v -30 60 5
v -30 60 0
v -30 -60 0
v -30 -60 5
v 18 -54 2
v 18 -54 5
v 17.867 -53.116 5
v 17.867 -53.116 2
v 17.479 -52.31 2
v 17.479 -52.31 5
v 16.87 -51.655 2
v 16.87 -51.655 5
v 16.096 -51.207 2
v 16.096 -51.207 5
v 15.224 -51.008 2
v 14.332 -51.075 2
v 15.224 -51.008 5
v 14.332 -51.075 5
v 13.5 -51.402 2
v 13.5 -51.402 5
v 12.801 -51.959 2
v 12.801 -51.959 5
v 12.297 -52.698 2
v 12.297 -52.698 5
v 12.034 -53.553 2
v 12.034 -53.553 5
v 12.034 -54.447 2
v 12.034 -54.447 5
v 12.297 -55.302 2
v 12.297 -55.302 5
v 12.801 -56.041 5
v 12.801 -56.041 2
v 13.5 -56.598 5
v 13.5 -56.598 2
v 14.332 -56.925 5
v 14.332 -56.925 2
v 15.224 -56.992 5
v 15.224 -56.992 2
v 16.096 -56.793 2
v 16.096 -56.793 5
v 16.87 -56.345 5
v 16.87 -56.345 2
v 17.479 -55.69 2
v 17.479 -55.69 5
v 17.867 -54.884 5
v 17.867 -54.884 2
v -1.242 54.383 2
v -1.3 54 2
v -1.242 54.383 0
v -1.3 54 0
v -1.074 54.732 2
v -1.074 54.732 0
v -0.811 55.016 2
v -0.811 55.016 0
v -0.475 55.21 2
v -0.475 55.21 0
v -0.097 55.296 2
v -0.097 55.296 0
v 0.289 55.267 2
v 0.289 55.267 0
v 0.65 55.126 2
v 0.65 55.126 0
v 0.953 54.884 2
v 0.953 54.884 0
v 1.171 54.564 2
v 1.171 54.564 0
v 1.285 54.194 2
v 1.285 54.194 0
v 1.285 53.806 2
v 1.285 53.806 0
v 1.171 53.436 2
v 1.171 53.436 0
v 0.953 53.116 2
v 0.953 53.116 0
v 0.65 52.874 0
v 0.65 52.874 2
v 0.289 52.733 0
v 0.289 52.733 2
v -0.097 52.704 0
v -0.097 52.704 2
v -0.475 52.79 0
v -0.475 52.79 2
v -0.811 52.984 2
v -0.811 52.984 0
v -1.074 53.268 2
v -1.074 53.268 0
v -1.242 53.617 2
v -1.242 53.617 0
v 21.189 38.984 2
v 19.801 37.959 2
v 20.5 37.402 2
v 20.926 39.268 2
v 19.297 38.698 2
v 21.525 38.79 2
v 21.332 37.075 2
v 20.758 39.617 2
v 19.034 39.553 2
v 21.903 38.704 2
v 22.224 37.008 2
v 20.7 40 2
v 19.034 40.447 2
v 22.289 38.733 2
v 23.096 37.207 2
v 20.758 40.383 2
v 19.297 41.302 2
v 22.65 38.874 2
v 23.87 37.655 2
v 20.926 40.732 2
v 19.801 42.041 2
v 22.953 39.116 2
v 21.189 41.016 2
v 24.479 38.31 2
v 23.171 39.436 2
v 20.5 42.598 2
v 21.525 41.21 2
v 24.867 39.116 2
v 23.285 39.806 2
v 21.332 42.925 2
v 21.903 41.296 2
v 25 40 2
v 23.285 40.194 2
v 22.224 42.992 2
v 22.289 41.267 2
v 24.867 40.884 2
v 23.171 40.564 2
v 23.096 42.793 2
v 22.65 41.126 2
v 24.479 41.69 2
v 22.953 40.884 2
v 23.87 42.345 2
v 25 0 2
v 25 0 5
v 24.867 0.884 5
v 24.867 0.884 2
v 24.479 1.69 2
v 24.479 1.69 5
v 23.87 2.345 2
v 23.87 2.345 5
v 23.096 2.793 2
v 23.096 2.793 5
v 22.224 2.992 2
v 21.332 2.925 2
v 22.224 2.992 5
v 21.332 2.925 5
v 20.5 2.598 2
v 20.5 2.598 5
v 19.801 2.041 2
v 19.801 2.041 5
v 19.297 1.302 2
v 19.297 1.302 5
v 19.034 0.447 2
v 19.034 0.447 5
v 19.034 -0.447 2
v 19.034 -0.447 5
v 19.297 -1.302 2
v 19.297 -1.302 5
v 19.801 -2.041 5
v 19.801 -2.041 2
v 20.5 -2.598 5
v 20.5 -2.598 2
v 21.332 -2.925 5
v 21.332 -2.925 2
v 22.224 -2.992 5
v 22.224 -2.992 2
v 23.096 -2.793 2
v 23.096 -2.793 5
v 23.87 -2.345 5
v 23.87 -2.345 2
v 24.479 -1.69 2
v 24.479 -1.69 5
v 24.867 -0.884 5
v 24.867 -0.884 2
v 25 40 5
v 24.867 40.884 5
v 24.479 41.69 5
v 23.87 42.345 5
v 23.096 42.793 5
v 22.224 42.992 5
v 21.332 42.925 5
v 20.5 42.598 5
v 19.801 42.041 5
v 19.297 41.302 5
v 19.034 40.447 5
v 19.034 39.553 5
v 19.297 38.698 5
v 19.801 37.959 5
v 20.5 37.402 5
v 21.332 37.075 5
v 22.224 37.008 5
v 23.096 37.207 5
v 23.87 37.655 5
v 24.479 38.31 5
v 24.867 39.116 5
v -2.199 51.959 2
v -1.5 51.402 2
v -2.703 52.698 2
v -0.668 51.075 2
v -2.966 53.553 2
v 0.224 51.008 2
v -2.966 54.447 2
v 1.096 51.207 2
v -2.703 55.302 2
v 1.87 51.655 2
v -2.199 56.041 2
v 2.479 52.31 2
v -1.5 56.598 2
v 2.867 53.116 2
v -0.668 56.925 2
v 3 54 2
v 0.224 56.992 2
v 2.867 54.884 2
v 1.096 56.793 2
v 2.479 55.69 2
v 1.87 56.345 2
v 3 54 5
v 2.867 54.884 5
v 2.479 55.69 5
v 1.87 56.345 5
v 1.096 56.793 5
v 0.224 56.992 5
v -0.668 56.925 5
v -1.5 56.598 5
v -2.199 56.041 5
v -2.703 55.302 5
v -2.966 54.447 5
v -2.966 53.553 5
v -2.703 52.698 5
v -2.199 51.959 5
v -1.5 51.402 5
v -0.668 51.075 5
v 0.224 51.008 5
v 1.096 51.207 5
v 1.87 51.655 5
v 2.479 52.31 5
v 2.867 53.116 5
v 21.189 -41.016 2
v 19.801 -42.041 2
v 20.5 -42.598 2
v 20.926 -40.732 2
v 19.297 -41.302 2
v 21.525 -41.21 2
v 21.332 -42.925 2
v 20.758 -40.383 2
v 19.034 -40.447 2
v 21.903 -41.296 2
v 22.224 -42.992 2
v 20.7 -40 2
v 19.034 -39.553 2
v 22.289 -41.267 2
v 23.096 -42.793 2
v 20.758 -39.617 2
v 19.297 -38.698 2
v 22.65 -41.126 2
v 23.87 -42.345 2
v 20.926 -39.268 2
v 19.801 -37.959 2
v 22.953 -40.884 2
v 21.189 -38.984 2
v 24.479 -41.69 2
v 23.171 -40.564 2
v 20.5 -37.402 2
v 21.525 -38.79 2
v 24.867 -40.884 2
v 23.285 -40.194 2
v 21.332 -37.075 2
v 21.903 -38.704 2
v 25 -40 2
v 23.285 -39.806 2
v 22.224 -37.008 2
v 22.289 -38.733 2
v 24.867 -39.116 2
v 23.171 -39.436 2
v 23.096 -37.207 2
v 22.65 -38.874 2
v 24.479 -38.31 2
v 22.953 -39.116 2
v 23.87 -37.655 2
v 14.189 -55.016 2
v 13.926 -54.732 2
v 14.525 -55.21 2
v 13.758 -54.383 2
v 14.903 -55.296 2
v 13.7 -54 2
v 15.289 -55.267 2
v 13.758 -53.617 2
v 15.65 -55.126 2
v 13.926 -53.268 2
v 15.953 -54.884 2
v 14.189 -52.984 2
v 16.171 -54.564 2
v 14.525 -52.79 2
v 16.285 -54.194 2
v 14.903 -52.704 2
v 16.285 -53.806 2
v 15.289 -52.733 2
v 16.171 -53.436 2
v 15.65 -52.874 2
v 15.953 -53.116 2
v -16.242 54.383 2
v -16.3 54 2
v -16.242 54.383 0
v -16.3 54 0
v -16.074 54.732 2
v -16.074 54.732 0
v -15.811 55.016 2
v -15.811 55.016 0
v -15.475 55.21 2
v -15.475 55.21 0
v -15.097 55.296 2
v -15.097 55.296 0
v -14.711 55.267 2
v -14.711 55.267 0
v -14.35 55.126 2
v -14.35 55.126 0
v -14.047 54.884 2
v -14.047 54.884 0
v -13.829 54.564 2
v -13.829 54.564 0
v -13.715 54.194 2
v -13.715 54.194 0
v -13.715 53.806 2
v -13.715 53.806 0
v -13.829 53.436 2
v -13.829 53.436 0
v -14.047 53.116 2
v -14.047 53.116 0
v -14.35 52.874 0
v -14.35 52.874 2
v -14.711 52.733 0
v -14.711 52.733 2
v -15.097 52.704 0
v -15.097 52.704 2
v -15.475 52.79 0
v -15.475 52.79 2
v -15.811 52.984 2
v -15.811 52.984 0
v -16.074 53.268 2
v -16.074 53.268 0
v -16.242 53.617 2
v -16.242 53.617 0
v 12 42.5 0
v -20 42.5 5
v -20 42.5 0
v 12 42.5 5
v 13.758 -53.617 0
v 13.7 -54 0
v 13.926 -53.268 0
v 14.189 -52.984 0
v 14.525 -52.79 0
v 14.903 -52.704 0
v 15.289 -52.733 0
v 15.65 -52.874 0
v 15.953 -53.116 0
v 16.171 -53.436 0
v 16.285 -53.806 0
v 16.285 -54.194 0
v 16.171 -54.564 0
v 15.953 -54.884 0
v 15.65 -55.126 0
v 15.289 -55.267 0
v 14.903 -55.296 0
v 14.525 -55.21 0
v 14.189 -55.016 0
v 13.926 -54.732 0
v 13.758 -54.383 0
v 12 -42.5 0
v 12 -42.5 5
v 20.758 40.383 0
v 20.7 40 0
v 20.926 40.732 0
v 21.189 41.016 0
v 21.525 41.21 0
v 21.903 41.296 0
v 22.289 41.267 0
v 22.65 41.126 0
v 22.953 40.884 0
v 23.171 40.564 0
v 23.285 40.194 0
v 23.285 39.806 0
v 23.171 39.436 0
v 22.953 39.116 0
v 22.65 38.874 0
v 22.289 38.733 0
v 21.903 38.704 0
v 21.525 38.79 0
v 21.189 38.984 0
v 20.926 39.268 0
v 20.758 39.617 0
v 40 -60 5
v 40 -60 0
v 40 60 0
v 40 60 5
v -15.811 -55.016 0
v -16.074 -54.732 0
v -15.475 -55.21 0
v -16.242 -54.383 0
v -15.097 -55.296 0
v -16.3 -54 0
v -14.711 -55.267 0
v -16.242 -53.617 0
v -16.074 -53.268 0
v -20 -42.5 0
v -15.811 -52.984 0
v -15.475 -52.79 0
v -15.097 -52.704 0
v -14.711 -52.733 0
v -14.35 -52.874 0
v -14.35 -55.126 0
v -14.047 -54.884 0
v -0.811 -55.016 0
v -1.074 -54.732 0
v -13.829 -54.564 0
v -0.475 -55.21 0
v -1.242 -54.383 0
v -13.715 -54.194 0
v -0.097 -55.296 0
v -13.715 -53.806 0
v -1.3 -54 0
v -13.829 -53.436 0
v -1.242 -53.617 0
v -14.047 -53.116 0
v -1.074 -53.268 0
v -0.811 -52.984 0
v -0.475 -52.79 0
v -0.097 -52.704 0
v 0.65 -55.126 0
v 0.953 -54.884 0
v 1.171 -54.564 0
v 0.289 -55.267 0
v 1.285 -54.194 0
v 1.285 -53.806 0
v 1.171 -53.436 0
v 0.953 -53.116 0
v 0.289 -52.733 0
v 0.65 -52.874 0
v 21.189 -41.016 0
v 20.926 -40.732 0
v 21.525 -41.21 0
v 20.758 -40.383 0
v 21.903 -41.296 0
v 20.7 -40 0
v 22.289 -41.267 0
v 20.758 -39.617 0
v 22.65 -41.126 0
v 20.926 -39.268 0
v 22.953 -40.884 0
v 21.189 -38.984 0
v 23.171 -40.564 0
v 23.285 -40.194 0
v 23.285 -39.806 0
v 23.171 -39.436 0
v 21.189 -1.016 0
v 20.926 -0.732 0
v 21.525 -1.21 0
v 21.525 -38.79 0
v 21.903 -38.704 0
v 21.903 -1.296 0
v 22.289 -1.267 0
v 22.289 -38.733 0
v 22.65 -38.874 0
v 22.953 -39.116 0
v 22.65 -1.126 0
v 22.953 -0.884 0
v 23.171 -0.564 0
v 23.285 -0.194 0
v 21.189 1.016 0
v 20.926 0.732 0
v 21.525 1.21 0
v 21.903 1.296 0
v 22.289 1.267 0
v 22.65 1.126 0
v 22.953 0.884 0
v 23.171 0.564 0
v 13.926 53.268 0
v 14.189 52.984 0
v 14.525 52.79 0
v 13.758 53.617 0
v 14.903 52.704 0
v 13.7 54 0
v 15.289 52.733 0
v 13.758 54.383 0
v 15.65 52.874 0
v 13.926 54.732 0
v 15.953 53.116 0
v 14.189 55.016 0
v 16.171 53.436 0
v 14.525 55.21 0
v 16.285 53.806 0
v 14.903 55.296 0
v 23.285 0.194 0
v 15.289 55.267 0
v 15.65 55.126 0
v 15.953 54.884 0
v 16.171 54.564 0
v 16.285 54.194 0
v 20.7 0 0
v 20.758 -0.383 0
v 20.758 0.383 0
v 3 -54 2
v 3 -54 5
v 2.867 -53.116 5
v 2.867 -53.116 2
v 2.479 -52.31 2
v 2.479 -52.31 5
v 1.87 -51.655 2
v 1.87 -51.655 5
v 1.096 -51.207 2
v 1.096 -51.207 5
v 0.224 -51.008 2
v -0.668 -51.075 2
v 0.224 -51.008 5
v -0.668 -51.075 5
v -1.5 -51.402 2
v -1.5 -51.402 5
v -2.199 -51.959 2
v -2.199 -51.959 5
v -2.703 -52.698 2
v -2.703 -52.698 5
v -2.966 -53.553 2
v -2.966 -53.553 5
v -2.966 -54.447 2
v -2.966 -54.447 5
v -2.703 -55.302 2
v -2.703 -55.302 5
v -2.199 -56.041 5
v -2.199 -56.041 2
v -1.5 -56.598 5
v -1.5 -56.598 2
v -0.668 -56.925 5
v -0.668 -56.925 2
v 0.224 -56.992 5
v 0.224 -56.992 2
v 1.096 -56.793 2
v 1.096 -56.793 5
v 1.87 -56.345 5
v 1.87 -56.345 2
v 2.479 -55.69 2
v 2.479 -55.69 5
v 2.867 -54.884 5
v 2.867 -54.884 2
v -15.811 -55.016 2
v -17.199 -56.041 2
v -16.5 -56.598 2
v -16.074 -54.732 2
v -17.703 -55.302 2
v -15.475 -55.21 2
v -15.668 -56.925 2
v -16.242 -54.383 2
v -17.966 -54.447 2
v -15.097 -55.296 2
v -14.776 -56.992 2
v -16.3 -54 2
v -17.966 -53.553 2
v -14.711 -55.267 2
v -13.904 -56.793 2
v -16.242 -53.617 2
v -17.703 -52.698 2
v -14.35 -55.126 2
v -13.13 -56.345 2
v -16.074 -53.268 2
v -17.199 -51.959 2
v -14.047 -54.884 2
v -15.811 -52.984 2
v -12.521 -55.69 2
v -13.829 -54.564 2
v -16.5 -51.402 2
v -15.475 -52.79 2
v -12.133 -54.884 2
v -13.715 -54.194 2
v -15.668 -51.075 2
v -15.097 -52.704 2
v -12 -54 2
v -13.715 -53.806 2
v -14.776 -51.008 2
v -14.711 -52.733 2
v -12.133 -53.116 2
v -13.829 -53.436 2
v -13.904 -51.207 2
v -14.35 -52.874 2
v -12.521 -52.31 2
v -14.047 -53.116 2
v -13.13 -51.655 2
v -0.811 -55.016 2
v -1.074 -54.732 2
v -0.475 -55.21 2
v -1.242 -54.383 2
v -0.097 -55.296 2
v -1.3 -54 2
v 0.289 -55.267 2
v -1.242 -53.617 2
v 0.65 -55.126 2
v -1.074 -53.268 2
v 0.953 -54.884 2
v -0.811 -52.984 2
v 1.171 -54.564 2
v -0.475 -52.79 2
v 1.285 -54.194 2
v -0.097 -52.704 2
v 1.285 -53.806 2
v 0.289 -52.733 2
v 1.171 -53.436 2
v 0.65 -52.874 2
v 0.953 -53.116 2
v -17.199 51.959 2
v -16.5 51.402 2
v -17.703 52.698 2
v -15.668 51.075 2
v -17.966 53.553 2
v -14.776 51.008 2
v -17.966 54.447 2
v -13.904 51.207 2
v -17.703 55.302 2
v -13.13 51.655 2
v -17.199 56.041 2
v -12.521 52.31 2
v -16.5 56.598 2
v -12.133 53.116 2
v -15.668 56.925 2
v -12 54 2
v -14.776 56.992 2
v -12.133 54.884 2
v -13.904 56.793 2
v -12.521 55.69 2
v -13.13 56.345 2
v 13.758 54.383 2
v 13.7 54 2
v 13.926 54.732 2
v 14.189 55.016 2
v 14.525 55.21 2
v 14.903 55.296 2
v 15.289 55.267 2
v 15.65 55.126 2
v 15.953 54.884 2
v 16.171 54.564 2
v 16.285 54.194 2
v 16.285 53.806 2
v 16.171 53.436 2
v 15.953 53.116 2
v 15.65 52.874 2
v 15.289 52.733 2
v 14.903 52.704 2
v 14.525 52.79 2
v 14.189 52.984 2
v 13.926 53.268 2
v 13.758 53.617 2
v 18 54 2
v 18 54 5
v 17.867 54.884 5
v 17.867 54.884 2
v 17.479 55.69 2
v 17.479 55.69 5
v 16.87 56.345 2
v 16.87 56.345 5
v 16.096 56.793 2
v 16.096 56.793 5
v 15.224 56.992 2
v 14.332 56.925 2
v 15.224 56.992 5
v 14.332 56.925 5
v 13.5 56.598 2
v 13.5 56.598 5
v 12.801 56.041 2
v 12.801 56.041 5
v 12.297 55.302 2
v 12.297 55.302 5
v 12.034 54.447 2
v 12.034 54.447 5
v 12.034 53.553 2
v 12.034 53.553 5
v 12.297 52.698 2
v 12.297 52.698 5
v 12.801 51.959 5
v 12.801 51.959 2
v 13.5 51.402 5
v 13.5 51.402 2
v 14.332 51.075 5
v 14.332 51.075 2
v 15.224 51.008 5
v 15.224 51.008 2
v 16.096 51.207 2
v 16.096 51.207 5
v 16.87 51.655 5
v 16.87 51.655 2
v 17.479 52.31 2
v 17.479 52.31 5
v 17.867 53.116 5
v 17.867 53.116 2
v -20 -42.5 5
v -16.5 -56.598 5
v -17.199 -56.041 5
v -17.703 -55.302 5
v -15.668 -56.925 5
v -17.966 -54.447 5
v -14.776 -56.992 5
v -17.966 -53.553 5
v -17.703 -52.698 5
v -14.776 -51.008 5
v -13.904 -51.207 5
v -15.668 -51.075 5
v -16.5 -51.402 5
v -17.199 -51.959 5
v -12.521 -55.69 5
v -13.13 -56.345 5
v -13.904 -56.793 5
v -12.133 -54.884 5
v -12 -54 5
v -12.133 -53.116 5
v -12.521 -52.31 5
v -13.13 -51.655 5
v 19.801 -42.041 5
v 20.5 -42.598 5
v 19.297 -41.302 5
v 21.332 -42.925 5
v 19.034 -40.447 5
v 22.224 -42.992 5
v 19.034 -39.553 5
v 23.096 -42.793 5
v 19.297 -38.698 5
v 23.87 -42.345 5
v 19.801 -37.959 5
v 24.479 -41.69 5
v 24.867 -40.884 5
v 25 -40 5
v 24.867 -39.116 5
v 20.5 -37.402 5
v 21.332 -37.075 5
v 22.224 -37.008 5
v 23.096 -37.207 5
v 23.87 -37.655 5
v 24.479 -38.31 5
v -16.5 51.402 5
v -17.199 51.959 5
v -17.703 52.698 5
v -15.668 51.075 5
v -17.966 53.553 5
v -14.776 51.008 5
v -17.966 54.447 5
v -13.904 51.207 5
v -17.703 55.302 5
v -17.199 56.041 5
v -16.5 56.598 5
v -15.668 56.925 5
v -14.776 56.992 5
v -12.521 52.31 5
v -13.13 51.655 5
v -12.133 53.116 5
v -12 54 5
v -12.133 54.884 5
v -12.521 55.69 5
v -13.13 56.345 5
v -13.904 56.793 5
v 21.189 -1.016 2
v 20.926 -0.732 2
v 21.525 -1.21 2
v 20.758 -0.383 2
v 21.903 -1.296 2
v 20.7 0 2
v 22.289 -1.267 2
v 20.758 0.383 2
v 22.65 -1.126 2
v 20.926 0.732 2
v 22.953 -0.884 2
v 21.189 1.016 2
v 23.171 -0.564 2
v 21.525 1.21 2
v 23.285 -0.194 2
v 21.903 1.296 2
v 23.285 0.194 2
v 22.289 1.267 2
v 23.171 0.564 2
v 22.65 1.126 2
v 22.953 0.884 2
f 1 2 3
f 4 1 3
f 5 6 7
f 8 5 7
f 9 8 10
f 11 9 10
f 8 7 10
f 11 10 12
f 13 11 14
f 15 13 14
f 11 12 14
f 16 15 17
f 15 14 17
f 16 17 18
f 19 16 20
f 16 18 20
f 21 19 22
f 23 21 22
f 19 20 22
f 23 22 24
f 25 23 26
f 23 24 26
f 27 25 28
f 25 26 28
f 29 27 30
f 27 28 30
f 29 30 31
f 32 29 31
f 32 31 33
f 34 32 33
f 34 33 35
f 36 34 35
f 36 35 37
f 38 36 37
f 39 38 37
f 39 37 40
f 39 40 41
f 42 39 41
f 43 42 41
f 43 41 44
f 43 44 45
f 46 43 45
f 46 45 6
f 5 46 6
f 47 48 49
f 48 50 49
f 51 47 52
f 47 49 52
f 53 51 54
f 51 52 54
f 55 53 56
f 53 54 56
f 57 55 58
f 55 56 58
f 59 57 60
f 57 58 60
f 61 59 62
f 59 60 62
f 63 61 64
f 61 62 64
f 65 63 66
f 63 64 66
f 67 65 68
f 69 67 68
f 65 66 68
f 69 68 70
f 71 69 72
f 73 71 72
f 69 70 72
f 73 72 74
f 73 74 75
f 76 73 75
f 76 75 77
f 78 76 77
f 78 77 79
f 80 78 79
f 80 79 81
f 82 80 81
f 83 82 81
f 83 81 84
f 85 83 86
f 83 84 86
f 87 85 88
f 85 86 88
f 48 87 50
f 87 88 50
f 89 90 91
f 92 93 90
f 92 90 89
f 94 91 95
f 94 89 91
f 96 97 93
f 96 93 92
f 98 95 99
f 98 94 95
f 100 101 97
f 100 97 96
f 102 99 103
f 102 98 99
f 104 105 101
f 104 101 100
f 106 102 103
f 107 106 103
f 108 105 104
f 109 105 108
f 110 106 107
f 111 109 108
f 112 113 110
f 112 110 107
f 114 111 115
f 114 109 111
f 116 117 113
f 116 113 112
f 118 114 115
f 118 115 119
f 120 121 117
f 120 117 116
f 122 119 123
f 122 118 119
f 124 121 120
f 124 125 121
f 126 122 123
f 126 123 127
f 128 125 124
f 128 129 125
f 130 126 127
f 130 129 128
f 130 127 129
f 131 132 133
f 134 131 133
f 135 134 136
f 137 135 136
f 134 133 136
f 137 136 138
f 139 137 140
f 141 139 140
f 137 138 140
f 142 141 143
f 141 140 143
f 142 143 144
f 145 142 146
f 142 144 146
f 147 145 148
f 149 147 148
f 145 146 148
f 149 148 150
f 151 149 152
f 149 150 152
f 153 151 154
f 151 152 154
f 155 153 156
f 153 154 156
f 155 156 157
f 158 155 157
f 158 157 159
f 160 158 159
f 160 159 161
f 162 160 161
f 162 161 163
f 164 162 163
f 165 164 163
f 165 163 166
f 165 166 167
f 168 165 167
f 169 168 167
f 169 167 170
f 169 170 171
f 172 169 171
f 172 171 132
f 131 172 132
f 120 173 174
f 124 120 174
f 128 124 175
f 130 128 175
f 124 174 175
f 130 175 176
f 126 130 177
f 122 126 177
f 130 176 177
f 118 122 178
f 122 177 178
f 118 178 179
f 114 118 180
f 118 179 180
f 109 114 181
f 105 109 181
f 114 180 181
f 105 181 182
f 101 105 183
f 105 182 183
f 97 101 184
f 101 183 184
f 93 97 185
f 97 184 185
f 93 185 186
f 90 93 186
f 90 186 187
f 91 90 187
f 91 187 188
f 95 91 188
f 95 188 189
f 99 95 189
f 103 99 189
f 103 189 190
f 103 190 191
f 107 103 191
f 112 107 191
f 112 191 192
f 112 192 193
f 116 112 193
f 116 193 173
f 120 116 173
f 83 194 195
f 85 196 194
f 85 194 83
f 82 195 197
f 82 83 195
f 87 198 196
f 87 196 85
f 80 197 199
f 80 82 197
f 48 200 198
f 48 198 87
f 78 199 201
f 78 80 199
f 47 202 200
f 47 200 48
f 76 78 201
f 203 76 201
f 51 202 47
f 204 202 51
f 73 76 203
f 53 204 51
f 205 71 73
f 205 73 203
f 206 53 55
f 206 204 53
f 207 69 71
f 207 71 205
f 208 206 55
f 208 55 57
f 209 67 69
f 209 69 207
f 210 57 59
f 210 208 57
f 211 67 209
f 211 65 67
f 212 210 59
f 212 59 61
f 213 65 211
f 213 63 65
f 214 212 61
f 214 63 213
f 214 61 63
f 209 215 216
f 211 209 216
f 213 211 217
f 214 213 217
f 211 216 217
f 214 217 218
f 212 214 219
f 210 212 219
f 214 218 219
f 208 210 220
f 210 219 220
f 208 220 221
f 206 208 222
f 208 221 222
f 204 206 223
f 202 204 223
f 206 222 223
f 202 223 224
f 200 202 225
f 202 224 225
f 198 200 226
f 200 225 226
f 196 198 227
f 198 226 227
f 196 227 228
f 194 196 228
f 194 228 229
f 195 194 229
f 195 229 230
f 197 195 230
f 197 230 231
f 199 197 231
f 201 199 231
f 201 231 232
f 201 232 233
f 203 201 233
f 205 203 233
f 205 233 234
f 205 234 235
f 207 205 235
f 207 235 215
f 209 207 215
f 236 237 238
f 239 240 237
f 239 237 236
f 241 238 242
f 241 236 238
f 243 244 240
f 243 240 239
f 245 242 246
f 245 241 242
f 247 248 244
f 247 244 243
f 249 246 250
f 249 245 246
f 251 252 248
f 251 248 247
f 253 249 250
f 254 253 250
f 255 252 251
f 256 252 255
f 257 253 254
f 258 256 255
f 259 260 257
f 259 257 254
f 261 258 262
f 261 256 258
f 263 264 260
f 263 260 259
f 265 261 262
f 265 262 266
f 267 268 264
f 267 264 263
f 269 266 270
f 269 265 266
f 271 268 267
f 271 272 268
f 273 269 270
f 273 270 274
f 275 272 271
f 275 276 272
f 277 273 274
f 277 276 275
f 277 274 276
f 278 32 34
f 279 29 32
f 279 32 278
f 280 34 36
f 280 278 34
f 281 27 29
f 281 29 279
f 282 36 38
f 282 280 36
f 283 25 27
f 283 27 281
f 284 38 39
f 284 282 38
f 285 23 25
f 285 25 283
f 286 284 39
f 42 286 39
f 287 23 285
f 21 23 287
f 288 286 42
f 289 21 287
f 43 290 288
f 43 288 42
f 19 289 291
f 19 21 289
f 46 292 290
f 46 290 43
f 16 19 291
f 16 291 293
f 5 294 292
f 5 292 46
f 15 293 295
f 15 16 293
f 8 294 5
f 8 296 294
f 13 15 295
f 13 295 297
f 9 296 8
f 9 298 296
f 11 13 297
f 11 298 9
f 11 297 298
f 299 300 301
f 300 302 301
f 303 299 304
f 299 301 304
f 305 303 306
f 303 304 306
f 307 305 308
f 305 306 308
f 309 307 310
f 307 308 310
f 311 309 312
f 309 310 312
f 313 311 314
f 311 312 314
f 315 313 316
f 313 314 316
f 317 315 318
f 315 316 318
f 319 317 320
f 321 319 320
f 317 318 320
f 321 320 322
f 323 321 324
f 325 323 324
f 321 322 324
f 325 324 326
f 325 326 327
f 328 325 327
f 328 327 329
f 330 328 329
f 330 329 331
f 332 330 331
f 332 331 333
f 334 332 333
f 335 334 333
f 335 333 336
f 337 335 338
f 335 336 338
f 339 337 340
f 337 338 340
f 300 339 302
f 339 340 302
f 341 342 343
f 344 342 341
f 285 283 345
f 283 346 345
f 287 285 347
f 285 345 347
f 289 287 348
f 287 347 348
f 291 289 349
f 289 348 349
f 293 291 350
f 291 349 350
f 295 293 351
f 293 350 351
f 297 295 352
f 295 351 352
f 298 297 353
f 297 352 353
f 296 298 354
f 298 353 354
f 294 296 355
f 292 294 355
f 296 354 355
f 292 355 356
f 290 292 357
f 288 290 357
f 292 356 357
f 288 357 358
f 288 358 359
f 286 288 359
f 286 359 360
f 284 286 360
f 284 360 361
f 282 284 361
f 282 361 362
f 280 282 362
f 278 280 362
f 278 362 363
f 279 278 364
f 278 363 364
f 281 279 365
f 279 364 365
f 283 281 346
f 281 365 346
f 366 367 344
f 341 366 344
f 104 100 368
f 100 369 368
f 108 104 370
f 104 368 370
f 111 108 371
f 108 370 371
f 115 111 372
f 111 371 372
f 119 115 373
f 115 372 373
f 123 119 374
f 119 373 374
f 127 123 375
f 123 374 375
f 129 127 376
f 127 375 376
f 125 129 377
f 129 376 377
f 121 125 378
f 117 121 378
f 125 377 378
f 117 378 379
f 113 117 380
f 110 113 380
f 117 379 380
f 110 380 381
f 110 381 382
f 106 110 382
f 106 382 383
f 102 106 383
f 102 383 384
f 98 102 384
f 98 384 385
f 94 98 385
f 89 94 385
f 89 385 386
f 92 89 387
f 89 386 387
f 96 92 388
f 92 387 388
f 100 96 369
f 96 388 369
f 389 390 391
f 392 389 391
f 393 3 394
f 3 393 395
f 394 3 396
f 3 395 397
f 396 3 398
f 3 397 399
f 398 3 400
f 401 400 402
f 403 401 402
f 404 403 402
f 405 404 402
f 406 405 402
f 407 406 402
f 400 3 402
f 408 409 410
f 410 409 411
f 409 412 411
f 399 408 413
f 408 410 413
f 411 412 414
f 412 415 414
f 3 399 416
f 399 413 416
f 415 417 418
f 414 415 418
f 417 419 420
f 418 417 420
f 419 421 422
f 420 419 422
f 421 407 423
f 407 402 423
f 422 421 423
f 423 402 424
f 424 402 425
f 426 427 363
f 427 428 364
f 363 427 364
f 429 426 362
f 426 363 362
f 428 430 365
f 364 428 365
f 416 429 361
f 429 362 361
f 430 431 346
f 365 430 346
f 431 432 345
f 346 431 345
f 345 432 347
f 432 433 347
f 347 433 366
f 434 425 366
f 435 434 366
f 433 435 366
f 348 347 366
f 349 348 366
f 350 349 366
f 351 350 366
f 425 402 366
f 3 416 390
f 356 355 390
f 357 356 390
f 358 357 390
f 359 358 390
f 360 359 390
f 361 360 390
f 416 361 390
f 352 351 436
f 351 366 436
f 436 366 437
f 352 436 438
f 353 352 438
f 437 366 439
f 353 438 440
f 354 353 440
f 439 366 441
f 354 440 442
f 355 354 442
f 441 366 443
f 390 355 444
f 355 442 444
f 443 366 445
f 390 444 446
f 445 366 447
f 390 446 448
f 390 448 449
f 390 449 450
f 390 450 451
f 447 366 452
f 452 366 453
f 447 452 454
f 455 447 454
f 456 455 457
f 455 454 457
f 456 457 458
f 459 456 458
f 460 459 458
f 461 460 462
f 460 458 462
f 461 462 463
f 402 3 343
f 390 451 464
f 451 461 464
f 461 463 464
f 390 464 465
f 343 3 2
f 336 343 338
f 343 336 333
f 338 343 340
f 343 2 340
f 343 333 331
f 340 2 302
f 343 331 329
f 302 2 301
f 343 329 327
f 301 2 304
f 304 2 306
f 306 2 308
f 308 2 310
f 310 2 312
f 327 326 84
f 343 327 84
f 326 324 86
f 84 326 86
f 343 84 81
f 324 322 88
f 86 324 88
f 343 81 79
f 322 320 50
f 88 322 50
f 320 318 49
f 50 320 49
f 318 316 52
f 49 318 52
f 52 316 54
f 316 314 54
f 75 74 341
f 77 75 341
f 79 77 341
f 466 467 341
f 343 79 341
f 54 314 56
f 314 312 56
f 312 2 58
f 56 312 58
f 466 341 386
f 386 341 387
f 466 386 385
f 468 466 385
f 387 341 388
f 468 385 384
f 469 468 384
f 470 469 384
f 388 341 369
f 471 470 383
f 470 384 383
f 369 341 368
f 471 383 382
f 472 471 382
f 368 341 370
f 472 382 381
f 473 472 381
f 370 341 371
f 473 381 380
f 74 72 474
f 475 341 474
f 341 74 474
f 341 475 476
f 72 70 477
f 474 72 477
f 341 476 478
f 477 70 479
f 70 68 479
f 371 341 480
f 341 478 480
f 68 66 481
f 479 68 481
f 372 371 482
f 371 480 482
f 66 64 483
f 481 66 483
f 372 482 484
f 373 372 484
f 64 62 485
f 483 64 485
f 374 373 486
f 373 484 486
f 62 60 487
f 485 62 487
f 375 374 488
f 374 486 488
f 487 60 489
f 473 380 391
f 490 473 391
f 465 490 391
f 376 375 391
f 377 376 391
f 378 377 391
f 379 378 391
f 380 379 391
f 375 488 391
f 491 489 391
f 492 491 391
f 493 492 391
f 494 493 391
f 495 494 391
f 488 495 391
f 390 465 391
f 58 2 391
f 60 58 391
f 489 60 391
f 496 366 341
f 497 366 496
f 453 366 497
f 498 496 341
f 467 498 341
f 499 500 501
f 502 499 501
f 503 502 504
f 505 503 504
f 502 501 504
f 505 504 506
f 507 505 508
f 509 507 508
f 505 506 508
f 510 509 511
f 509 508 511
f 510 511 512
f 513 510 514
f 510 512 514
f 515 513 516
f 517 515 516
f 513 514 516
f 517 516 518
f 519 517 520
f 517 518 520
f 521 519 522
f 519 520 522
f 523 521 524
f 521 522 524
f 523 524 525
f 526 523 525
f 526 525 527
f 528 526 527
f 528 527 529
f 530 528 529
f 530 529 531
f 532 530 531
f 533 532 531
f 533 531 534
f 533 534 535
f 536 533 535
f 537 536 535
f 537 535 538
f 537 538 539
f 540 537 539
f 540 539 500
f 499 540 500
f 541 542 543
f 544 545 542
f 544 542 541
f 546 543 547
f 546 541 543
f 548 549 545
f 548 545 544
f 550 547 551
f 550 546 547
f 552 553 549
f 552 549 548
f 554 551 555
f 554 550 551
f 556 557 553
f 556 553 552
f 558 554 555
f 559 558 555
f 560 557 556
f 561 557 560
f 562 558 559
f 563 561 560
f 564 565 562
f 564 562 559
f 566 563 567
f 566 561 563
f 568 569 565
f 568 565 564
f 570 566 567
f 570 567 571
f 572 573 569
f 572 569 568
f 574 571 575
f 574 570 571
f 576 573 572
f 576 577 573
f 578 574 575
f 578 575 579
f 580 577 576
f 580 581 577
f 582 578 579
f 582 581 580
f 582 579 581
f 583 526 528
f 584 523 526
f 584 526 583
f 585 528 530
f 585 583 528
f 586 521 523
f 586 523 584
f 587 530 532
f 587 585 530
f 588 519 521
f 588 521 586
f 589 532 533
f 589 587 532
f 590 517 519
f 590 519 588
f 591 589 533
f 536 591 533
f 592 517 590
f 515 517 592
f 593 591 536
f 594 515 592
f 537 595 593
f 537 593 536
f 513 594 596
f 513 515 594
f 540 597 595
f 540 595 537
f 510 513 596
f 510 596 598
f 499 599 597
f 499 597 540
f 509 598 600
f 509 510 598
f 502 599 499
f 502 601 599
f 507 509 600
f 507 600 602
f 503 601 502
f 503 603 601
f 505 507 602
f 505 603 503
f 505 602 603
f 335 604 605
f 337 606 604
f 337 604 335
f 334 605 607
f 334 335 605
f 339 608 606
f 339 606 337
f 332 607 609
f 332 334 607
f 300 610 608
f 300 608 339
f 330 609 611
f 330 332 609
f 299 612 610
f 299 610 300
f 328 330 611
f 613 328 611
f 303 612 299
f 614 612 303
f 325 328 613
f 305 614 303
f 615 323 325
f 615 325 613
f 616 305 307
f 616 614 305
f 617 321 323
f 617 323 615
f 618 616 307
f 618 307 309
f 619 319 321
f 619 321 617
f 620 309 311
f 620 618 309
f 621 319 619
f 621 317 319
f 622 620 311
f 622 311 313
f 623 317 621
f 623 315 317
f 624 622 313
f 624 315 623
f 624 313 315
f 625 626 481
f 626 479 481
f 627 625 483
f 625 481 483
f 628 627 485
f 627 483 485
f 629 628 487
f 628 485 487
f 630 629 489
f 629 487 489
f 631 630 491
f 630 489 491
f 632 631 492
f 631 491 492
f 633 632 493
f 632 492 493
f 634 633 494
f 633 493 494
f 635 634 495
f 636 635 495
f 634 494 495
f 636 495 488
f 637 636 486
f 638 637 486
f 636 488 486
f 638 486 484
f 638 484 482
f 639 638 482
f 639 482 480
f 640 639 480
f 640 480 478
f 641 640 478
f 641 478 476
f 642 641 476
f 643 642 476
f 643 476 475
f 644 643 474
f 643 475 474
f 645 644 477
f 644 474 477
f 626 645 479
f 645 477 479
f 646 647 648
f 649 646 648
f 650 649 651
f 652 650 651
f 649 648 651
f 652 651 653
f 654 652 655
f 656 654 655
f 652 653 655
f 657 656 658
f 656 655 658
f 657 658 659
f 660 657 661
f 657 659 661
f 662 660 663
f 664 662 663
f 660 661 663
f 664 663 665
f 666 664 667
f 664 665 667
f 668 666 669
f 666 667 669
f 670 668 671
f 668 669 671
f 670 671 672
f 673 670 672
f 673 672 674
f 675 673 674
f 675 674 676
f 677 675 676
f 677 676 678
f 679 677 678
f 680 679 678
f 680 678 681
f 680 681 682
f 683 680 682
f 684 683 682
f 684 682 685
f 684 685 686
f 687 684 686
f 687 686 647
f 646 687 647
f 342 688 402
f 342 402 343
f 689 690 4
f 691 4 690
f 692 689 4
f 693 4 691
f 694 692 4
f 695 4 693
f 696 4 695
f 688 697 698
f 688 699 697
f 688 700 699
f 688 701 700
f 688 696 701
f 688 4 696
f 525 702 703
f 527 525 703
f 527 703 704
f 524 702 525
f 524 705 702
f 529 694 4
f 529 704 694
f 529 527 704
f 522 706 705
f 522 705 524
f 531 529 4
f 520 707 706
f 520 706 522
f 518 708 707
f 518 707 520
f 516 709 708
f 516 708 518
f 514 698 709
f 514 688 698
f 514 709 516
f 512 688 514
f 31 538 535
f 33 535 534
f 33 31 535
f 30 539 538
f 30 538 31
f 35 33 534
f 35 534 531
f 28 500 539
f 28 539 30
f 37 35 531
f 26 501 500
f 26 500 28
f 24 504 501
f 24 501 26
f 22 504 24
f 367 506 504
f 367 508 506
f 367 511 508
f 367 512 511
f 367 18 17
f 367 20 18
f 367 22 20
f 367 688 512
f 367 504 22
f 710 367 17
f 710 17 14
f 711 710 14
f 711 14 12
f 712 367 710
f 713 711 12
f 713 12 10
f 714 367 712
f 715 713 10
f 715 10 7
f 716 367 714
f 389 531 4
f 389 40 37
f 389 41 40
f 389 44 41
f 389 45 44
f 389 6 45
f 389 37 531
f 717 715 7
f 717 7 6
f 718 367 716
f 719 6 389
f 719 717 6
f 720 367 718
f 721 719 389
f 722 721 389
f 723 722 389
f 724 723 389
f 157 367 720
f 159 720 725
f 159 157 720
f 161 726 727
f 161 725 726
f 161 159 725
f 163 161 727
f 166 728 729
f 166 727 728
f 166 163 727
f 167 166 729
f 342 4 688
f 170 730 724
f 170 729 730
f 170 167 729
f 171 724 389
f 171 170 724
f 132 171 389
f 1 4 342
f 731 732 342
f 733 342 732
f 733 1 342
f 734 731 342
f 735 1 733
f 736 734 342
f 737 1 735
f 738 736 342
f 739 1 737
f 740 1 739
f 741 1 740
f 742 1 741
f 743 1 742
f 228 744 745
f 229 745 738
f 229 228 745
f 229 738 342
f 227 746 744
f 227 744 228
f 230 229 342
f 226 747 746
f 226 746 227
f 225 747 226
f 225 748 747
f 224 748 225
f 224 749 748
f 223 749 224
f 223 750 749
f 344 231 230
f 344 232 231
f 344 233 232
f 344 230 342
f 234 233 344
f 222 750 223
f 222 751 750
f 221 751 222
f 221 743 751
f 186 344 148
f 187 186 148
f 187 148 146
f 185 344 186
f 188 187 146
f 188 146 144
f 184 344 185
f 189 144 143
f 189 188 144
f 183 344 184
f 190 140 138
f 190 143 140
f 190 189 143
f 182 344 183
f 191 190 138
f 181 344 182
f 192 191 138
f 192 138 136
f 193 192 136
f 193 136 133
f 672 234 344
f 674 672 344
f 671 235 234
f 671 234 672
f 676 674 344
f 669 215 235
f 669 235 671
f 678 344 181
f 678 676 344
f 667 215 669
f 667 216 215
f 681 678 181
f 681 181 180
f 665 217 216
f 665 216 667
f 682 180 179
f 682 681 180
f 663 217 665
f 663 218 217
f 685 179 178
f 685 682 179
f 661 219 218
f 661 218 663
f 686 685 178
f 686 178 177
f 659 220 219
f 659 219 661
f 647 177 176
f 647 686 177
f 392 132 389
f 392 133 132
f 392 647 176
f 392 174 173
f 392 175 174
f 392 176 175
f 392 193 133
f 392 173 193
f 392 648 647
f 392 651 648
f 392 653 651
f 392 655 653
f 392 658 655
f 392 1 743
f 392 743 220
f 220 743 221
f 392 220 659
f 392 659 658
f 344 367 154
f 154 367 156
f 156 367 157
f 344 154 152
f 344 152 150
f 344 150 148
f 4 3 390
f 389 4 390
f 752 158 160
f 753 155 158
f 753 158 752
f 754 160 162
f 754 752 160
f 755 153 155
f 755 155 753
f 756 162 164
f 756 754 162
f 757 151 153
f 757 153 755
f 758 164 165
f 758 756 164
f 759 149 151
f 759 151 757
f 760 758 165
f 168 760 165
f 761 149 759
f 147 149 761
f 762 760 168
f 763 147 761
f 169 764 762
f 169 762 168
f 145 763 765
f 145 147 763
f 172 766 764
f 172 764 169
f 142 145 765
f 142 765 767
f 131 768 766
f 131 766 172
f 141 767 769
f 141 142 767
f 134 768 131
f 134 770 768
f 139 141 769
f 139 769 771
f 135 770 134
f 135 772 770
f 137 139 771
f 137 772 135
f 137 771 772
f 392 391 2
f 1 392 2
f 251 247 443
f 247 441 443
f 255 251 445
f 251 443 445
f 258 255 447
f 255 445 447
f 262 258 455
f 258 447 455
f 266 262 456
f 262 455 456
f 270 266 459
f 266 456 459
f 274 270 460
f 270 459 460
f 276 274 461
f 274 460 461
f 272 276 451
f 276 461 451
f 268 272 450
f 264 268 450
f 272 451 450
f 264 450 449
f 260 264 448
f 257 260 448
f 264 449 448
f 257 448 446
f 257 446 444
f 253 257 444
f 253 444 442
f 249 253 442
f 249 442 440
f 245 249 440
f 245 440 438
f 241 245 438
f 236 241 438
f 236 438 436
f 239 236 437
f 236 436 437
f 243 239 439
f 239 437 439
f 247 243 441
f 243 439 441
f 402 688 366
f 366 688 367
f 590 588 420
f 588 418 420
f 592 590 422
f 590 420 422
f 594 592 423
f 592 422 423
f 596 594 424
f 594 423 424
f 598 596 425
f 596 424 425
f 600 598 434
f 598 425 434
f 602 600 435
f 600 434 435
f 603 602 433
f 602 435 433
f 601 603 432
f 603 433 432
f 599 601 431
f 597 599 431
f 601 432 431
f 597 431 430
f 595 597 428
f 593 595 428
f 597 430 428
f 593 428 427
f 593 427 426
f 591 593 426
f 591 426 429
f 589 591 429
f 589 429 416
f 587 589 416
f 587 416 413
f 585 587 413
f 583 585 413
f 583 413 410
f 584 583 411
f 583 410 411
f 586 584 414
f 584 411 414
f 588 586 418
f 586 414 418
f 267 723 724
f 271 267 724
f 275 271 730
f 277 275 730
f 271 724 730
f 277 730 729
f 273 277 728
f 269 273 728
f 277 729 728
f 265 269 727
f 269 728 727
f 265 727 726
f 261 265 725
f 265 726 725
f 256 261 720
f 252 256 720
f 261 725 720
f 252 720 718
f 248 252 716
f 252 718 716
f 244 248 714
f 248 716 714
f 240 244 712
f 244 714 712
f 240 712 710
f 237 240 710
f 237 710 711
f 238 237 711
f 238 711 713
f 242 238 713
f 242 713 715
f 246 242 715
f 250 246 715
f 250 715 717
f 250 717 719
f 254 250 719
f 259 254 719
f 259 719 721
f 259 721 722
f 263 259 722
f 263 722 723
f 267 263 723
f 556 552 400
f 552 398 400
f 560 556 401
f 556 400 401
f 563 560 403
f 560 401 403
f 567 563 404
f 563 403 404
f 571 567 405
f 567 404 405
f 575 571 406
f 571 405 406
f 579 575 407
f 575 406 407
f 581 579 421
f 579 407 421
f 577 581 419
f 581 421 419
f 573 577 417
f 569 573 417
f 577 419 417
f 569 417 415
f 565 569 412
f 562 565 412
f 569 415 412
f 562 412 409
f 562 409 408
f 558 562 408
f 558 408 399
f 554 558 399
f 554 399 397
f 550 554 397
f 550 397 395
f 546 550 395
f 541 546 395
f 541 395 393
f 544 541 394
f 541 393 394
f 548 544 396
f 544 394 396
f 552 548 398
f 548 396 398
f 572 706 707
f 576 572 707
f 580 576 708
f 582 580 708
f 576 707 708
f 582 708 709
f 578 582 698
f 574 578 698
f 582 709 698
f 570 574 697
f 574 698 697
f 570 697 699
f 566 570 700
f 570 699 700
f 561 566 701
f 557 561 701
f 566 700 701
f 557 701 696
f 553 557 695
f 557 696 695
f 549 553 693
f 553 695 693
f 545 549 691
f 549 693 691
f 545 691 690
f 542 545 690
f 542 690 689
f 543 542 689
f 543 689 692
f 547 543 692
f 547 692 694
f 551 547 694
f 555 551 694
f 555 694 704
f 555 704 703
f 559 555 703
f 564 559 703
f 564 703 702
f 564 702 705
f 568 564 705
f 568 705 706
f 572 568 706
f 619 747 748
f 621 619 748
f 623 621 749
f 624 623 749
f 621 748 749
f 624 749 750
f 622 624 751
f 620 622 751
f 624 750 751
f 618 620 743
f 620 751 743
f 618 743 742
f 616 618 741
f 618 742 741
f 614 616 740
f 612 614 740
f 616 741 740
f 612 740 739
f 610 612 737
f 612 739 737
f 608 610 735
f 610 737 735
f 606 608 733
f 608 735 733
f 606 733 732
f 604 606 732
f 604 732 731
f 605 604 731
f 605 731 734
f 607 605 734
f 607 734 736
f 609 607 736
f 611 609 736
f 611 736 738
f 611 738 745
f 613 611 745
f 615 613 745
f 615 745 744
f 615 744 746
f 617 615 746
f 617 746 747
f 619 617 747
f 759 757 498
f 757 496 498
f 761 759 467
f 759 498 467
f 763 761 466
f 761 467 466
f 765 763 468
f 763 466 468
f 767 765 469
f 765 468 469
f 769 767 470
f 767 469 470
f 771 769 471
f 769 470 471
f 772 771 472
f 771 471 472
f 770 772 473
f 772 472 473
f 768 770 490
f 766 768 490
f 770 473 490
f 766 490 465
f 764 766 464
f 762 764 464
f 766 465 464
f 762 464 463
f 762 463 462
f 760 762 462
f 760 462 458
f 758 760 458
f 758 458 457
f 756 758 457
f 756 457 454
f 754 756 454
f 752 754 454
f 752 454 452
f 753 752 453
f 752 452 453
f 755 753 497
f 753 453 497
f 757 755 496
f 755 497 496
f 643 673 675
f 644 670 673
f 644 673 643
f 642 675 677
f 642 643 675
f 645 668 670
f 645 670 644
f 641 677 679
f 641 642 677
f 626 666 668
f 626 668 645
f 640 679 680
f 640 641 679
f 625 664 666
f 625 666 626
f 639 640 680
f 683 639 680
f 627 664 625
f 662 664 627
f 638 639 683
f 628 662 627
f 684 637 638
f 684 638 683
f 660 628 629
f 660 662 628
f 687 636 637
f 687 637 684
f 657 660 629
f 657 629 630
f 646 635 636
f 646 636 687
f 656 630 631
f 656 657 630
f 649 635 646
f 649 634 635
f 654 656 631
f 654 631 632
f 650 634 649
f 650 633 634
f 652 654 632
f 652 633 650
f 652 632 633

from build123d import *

# Parameters (mm, degrees)
EXTRUDE_1_DEPTH           = 5
HOLE_WIZARD_2_D           = 2.6
HOLE_WIZARD_2_DEPTH       = 10
HOLE_WIZARD_2_CBORE_D     = 6
HOLE_WIZARD_2_CBORE_DEPTH = 3
SKETCH_8_W                = 32
SKETCH_8_H                = 85
CUT_EXTRUDE_1_DEPTH       = 73.284161474


with BuildPart() as part:
    # 草圖3 → 填料-伸長1 (new body)
    with BuildSketch(Plane.XY):
        Polygon((-30, 60), (-30, -60), (0, -60), (40, -60), (40, 60), (0, 60), align=None)
    extrude(amount=EXTRUDE_1_DEPTH)

    # 鑽孔2
    with Locations(Plane(origin=(-15, 54, 5), x_dir=(1, 0, 0), z_dir=(0, 0, 1))):
        with Locations((0, 0), (15, 0), (30, 0), (37, -14), (37, -94), (30, -108), (15, -108), (0, -108), (37, -54)):
            CounterBoreHole(HOLE_WIZARD_2_D / 2, HOLE_WIZARD_2_CBORE_D / 2, HOLE_WIZARD_2_CBORE_DEPTH, depth=HOLE_WIZARD_2_DEPTH)

    # 草圖8 → 除料-伸長1 (cut, through all)
    with BuildSketch(Plane.XY.offset(5)):
        with Locations((-4, 0)):
            Rectangle(SKETCH_8_W, SKETCH_8_H)
    extrude(amount=-CUT_EXTRUDE_1_DEPTH, mode=Mode.SUBTRACT)


solid = part.part
